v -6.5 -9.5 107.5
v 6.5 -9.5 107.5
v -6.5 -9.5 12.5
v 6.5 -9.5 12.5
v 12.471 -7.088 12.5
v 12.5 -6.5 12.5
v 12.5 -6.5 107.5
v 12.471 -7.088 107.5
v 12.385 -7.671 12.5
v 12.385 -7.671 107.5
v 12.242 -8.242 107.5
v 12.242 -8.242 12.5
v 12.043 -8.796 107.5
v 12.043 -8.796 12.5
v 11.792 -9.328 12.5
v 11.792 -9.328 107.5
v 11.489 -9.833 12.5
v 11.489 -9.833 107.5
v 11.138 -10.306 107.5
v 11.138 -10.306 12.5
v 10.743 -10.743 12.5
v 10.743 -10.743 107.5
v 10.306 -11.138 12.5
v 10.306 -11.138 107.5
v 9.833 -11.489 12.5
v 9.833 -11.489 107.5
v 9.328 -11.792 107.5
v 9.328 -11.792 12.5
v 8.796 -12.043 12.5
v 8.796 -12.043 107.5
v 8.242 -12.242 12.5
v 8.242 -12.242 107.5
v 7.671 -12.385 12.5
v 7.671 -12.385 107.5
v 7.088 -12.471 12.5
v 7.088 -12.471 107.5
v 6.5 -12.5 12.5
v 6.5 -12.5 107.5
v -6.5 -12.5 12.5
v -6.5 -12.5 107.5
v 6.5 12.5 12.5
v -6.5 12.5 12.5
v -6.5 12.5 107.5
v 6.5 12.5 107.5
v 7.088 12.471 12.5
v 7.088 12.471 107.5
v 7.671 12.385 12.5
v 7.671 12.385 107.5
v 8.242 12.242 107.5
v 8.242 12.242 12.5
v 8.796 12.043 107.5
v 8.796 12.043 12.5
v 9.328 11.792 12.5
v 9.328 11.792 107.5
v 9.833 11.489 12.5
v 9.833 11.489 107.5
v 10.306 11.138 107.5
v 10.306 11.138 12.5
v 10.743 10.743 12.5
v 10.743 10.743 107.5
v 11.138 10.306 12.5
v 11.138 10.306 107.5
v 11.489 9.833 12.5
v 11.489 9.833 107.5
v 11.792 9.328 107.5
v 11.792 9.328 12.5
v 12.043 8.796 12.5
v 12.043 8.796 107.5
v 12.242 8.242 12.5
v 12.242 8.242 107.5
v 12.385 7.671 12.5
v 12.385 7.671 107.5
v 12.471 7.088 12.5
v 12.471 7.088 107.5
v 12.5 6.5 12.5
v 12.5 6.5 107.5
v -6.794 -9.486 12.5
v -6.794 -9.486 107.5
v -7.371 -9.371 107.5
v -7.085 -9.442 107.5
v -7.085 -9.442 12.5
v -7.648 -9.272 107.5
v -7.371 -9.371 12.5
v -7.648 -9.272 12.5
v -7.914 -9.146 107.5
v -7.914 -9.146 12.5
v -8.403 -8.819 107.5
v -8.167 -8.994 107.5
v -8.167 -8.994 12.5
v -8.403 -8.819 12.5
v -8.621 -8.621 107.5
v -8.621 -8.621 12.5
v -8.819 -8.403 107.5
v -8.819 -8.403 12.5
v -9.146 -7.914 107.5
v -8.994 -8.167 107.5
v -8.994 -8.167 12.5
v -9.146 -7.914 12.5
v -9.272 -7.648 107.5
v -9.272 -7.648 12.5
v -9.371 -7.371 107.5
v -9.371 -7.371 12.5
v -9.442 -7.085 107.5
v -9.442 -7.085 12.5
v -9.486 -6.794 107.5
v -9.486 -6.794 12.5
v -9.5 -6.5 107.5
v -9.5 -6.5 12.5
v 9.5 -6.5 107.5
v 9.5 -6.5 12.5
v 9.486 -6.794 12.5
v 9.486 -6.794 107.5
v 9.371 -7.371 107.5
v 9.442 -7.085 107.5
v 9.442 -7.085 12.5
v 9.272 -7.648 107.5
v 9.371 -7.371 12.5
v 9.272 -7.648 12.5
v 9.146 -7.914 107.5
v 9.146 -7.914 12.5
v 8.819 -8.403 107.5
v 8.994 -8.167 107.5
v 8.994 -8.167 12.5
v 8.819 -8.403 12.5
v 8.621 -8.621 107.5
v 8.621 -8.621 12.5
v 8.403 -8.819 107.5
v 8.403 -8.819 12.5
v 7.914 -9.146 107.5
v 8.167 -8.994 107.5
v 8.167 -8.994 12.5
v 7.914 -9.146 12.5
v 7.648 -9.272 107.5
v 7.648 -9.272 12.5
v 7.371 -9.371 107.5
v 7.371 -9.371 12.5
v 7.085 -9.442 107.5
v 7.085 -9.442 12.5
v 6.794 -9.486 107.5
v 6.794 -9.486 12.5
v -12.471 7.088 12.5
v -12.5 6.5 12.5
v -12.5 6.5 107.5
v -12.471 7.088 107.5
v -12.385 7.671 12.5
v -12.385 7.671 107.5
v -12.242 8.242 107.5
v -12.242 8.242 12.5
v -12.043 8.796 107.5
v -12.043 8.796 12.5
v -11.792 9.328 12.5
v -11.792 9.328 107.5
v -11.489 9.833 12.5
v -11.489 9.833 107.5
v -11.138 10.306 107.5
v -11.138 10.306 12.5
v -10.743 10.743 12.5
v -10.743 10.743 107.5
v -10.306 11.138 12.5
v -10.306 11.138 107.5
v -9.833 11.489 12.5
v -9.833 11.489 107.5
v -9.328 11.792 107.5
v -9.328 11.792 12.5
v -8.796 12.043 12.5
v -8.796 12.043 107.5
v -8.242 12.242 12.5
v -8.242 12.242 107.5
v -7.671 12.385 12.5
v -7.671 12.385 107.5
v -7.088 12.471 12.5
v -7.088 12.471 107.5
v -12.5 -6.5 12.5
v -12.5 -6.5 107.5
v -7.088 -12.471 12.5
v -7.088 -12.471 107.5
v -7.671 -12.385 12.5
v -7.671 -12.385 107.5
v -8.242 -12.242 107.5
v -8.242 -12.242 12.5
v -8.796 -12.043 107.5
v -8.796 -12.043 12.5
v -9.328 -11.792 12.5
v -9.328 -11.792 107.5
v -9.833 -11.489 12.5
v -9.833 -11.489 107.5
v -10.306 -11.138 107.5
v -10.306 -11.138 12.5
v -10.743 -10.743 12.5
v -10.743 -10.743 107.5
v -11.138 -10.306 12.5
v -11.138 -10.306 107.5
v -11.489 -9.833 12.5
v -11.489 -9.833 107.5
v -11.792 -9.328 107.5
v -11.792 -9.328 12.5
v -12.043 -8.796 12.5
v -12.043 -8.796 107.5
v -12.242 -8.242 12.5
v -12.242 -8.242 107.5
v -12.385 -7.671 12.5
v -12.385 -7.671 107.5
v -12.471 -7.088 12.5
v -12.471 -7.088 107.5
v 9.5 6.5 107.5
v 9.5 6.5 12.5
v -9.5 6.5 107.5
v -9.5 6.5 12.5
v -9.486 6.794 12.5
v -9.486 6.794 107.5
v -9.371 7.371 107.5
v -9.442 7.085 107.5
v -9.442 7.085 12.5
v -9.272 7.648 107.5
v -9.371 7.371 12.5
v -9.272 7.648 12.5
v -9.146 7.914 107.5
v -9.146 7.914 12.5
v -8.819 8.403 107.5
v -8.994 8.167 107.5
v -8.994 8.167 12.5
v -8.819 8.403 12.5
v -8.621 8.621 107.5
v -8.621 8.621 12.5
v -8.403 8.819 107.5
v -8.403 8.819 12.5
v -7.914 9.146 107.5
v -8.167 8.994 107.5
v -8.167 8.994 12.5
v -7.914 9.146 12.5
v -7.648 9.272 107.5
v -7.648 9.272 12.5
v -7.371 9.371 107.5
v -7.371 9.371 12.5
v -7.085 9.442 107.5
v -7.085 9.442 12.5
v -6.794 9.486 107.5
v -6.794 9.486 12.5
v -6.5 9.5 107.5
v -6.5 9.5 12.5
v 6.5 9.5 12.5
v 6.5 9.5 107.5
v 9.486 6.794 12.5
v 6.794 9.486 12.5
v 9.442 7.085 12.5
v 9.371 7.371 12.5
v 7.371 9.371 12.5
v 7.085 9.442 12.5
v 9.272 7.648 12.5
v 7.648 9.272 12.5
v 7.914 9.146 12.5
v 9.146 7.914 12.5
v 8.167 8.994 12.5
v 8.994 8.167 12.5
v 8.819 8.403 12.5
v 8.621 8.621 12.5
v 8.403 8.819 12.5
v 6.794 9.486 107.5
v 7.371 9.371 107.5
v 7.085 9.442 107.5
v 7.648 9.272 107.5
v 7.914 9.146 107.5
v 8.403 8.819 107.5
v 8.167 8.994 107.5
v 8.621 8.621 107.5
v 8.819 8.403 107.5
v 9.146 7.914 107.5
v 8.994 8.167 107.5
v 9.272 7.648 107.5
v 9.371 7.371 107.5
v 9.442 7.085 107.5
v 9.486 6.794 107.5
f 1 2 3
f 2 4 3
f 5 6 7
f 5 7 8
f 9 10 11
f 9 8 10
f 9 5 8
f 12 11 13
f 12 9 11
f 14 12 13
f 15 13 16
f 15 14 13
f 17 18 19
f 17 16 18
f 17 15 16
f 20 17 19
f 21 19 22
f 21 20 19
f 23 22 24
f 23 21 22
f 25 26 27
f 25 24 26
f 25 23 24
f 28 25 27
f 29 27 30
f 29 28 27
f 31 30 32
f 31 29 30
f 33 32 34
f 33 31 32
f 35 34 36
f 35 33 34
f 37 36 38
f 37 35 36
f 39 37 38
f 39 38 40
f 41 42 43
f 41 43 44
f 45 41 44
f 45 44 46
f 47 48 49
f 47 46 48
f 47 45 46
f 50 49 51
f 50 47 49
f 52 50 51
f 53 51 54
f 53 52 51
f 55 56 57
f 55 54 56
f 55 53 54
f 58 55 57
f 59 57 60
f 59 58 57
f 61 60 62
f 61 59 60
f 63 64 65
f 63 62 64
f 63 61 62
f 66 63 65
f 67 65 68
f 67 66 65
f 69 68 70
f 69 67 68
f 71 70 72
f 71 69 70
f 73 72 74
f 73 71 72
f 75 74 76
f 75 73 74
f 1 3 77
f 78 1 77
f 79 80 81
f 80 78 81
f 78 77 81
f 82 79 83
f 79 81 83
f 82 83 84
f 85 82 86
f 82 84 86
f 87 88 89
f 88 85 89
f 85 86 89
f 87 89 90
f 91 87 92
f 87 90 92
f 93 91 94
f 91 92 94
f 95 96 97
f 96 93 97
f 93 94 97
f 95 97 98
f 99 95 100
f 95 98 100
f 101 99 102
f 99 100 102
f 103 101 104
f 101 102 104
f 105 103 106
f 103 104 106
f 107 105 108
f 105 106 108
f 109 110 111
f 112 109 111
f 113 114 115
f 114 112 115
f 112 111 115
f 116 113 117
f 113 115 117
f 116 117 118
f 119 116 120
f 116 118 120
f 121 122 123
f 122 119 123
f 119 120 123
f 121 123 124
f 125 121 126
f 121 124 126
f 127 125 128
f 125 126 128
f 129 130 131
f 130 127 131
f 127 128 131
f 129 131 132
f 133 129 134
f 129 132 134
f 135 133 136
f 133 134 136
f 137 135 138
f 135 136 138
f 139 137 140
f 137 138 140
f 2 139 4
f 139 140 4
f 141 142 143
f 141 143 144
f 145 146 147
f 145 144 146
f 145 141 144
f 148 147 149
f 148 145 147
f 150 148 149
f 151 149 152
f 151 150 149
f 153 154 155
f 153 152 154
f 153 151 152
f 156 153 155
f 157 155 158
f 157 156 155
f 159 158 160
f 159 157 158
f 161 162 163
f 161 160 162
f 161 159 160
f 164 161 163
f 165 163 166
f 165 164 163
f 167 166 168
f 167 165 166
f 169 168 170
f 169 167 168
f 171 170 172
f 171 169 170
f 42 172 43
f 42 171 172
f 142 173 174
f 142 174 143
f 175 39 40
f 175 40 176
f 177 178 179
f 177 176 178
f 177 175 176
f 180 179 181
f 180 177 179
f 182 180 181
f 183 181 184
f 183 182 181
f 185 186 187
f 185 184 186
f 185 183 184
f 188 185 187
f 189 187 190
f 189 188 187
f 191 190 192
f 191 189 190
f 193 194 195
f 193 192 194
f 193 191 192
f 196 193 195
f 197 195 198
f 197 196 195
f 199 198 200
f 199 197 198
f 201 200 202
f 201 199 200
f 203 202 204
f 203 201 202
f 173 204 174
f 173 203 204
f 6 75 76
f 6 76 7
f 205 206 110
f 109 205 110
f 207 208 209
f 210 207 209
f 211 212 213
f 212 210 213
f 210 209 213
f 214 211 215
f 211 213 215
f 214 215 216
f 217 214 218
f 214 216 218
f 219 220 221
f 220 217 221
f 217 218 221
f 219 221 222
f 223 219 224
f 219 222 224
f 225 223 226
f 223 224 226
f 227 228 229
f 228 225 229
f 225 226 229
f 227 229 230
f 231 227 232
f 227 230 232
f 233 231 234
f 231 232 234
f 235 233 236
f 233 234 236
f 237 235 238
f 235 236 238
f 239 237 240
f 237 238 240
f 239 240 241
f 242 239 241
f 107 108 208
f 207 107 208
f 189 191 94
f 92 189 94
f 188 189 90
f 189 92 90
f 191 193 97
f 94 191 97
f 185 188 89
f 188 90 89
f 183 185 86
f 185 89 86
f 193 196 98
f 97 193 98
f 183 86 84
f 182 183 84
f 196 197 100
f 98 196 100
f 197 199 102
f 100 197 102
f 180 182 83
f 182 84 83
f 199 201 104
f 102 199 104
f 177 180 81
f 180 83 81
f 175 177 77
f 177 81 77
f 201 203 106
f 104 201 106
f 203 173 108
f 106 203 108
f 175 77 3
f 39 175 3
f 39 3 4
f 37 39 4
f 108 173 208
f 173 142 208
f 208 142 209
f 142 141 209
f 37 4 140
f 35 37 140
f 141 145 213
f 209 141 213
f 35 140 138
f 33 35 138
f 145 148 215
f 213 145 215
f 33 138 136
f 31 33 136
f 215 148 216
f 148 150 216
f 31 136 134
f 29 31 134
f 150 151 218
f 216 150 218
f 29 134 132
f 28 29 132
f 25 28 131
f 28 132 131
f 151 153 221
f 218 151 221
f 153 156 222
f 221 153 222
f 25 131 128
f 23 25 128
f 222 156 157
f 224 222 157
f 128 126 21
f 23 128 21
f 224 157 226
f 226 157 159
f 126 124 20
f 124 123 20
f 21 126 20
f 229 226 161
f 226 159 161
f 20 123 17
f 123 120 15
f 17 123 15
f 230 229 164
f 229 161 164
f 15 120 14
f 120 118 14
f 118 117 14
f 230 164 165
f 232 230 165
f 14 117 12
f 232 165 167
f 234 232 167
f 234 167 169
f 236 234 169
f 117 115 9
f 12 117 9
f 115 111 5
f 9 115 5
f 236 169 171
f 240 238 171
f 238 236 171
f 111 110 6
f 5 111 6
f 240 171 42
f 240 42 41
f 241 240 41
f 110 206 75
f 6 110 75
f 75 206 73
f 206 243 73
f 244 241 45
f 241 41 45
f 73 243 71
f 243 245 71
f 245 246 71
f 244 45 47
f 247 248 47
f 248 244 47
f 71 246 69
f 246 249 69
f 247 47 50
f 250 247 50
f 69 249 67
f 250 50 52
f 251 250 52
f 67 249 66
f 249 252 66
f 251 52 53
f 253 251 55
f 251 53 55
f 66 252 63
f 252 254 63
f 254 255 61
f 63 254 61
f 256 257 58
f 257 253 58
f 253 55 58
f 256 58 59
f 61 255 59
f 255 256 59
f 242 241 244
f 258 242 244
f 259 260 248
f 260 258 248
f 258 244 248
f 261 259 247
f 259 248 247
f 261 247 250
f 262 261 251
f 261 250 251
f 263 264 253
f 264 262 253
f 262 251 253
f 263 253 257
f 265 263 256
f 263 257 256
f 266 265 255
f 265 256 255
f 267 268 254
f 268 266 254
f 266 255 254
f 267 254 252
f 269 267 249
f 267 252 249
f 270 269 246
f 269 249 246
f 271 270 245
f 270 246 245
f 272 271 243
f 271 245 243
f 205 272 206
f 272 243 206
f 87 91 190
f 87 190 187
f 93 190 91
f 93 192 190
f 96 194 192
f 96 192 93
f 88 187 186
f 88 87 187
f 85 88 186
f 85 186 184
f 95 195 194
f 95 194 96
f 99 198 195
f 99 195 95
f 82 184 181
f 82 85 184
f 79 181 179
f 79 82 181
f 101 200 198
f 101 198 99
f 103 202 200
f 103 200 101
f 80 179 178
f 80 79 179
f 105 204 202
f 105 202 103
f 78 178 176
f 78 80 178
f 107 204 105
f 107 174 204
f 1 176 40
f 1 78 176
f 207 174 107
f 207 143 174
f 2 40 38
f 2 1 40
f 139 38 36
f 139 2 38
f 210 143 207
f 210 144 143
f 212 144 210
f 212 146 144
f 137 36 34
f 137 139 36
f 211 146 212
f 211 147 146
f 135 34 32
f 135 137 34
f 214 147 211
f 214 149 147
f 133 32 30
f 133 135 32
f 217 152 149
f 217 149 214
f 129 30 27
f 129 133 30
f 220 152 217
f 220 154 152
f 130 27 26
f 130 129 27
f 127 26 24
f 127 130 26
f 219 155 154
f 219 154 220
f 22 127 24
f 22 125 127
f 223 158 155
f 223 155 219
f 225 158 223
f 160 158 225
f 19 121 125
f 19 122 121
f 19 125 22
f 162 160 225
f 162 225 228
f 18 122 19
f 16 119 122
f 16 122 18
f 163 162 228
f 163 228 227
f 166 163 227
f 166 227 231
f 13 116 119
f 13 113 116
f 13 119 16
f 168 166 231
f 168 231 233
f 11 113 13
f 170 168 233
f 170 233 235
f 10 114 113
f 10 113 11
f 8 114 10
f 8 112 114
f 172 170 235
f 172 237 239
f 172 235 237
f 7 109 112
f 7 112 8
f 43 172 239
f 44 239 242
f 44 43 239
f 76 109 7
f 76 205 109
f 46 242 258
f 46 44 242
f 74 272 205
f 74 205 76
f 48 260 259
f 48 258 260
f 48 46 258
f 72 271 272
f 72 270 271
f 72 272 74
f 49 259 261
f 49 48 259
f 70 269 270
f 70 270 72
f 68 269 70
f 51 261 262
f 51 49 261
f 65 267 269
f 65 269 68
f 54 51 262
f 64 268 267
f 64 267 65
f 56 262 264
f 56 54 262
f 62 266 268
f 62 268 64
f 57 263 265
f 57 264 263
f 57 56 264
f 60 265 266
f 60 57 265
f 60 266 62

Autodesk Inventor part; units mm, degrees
ref_plane "Start plane" through (0, 0, 12.5) normal (0, 0, 1) x (1, 0, 0)
ref_plane "End plane" through (0, 0, 107.5) normal (0, 0, 1) x (1, 0, 0)
sketch "Sketch" plane through (0, 0, 0) normal (0, 0, 1) x (1, 0, 0)
  line L0 (-12.5, -6.5) -> (-12.5, 6.5)
  line L1 (-6.5, 12.5) -> (6.5, 12.5)
  line L2 (12.5, 6.5) -> (12.5, -6.5)
  line L3 (6.5, -12.5) -> (-6.5, -12.5)
  arc A0 (-12.5, -6.5) -> (-6.5, -12.5) centre (-6.5, -6.5) ccw
  arc A1 (-6.5, 12.5) -> (-12.5, 6.5) centre (-6.5, 6.5) ccw
  arc A2 (12.5, 6.5) -> (6.5, 12.5) centre (6.5, 6.5) ccw
  arc A3 (6.5, -12.5) -> (12.5, -6.5) centre (6.5, -6.5) ccw
  arc A4 (-6.5, 9.5) -> (-9.5, 6.5) centre (-6.5, 6.5) ccw
  line L4 (-6.5, 9.5) -> (6.5, 9.5)
  arc A5 (9.5, 6.5) -> (6.5, 9.5) centre (6.5, 6.5) ccw
  line L5 (9.5, 6.5) -> (9.5, -6.5)
  arc A6 (6.5, -9.5) -> (9.5, -6.5) centre (6.5, -6.5) ccw
  line L6 (6.5, -9.5) -> (-6.5, -9.5)
  arc A7 (-9.5, -6.5) -> (-6.5, -9.5) centre (-6.5, -6.5) ccw
  line L7 (-9.5, -6.5) -> (-9.5, 6.5)
  line L8 (0, 19.2397) -> (0, -19.2397) construction
  line L9 (-19.2397, 0) -> (19.2397, 0) construction
  dimension "d7" = 6
  dimension "d10" = 25
  dimension "d11" = 25
  dimension "d12" = 3
  dimension "d15" = 12.5
  dimension "d16" = 12.5
extrude "Body" add sketch "Sketch" along normal up to surface (95 mm away) from surface at 12.5
sketch "Sketch3" plane through (0, 0, 0) normal (0, 0, 1) x (1, 0, 0)
  line L0 (0, 0) -> (10, 0)
ref_plane "Work Plane3" through (0, 0, 0) normal (0, -1, 0) x (1, 0, 0)
sketch "Sketch4" plane through (0, 0, 0) normal (0, -1, 0) x (1, 0, 0)
  line L0 (-2, 12.5) -> (12, 12.5)
  line L1 (-2, 107.5) -> (12, 107.5)
  dimension "d18" = 95
ref_plane "Work Plane4" through (0, 0, 12.5) normal (0, 0, -1) x (-1, 0, 0)
split "Split1" plane through (0, 0, 12.5) removes the side toward (0, 0, -1)
ref_plane "Work Plane5" through (0, -12.5, 107.5) normal (0, 0, 1) x (1, 0, 0)
split "Split2" plane through (0, -12.5, 107.5) removes the side toward (0, 0, 1)
equation "\"d7\" = G_IR"
equation "\"d10\" = G_H"
equation "\"d11\" = G_W"
equation "\"d12\" = G_T"
equation "\"d15\" = 0.5 * d10"
equation "\"d16\" = 0.5 * d11"
equation "\"d3\" = G_L"
equation "\"G_W\" = 25"
equation "\"G_H\" = 25"
equation "\"G_T\" = 3"
equation "\"G_IR\" = 6"
equation "\"G_L\" = d18"
equation "\"G_OFFSET_START\" = -12.5"
equation "\"G_OFFSET_END\" = -17.5"
equation "\"d13\" = -G_OFFSET_START"
equation "\"d14\" = G_OFFSET_END + B_L"
equation "\"B_L\" = 125"
properties part number "AS 1163 - C350L0 25x25x3.0 SHS - 95" material "Steel, Mild"
